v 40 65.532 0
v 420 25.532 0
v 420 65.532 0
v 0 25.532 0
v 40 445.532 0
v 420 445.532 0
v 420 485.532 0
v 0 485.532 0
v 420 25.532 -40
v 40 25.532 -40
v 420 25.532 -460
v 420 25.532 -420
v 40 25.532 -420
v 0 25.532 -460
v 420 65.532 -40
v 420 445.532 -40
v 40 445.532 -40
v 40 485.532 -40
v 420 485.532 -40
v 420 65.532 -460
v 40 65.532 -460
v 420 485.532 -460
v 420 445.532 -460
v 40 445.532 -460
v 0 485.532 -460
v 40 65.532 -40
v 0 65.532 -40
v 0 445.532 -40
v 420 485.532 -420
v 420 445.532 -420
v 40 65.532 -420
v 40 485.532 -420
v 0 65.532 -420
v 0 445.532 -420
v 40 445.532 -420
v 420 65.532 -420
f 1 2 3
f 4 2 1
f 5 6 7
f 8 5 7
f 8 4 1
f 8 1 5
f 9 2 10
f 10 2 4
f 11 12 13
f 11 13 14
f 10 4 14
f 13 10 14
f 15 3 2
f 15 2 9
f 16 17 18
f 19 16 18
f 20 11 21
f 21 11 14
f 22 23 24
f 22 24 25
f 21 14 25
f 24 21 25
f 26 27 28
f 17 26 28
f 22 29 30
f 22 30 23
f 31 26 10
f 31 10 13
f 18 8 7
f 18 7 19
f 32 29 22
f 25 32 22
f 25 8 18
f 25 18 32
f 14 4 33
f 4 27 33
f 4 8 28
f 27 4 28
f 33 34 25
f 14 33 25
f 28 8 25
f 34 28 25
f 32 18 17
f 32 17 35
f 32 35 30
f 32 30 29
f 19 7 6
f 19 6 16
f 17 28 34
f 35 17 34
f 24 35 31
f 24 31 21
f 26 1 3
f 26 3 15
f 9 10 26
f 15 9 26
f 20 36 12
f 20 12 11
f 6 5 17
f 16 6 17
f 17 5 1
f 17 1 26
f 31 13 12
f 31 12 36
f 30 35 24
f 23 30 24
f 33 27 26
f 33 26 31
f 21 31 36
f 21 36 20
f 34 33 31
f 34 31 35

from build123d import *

# Parameters (mm, degrees)
SKETCH_1_W      = 460
SKETCH_1_H      = 460
SKETCH_1_W_2    = 380
SKETCH_1_H_2    = 380
EXTRUDE_2_DEPTH = 40
SKETCH_2_W      = 40
SKETCH_2_H      = 40
EXTRUDE_3_DEPTH = 380


with BuildPart() as part:
    # 草图1 → 凸台-拉伸2 (new body)
    with BuildSketch(Plane(origin=(0, 0, 0), x_dir=(0, 0, -1), z_dir=(1, 0, 0))):
        with Locations((230, 255.532389843)):
            Rectangle(SKETCH_1_W, SKETCH_1_H)
        with Locations((230, 255.532389843)):
            Rectangle(SKETCH_1_W_2, SKETCH_1_H_2, mode=Mode.SUBTRACT)
    extrude(amount=EXTRUDE_2_DEPTH)

    # 草图2 → 凸台-拉伸3 (add)
    with BuildSketch(Plane(origin=(40, 0, 0), x_dir=(0, 0, -1), z_dir=(1, 0, 0))):
        with Locations((20, 465.532389843)):
            Rectangle(SKETCH_2_W, SKETCH_2_H)
        with Locations((440, 465.532389843)):
            Rectangle(SKETCH_2_W, SKETCH_2_H)
        with Locations((440, 45.532389843)):
            Rectangle(SKETCH_2_W, SKETCH_2_H)
        with Locations((20, 45.532389843)):
            Rectangle(SKETCH_2_W, SKETCH_2_H)
    extrude(amount=EXTRUDE_3_DEPTH)


solid = part.part
